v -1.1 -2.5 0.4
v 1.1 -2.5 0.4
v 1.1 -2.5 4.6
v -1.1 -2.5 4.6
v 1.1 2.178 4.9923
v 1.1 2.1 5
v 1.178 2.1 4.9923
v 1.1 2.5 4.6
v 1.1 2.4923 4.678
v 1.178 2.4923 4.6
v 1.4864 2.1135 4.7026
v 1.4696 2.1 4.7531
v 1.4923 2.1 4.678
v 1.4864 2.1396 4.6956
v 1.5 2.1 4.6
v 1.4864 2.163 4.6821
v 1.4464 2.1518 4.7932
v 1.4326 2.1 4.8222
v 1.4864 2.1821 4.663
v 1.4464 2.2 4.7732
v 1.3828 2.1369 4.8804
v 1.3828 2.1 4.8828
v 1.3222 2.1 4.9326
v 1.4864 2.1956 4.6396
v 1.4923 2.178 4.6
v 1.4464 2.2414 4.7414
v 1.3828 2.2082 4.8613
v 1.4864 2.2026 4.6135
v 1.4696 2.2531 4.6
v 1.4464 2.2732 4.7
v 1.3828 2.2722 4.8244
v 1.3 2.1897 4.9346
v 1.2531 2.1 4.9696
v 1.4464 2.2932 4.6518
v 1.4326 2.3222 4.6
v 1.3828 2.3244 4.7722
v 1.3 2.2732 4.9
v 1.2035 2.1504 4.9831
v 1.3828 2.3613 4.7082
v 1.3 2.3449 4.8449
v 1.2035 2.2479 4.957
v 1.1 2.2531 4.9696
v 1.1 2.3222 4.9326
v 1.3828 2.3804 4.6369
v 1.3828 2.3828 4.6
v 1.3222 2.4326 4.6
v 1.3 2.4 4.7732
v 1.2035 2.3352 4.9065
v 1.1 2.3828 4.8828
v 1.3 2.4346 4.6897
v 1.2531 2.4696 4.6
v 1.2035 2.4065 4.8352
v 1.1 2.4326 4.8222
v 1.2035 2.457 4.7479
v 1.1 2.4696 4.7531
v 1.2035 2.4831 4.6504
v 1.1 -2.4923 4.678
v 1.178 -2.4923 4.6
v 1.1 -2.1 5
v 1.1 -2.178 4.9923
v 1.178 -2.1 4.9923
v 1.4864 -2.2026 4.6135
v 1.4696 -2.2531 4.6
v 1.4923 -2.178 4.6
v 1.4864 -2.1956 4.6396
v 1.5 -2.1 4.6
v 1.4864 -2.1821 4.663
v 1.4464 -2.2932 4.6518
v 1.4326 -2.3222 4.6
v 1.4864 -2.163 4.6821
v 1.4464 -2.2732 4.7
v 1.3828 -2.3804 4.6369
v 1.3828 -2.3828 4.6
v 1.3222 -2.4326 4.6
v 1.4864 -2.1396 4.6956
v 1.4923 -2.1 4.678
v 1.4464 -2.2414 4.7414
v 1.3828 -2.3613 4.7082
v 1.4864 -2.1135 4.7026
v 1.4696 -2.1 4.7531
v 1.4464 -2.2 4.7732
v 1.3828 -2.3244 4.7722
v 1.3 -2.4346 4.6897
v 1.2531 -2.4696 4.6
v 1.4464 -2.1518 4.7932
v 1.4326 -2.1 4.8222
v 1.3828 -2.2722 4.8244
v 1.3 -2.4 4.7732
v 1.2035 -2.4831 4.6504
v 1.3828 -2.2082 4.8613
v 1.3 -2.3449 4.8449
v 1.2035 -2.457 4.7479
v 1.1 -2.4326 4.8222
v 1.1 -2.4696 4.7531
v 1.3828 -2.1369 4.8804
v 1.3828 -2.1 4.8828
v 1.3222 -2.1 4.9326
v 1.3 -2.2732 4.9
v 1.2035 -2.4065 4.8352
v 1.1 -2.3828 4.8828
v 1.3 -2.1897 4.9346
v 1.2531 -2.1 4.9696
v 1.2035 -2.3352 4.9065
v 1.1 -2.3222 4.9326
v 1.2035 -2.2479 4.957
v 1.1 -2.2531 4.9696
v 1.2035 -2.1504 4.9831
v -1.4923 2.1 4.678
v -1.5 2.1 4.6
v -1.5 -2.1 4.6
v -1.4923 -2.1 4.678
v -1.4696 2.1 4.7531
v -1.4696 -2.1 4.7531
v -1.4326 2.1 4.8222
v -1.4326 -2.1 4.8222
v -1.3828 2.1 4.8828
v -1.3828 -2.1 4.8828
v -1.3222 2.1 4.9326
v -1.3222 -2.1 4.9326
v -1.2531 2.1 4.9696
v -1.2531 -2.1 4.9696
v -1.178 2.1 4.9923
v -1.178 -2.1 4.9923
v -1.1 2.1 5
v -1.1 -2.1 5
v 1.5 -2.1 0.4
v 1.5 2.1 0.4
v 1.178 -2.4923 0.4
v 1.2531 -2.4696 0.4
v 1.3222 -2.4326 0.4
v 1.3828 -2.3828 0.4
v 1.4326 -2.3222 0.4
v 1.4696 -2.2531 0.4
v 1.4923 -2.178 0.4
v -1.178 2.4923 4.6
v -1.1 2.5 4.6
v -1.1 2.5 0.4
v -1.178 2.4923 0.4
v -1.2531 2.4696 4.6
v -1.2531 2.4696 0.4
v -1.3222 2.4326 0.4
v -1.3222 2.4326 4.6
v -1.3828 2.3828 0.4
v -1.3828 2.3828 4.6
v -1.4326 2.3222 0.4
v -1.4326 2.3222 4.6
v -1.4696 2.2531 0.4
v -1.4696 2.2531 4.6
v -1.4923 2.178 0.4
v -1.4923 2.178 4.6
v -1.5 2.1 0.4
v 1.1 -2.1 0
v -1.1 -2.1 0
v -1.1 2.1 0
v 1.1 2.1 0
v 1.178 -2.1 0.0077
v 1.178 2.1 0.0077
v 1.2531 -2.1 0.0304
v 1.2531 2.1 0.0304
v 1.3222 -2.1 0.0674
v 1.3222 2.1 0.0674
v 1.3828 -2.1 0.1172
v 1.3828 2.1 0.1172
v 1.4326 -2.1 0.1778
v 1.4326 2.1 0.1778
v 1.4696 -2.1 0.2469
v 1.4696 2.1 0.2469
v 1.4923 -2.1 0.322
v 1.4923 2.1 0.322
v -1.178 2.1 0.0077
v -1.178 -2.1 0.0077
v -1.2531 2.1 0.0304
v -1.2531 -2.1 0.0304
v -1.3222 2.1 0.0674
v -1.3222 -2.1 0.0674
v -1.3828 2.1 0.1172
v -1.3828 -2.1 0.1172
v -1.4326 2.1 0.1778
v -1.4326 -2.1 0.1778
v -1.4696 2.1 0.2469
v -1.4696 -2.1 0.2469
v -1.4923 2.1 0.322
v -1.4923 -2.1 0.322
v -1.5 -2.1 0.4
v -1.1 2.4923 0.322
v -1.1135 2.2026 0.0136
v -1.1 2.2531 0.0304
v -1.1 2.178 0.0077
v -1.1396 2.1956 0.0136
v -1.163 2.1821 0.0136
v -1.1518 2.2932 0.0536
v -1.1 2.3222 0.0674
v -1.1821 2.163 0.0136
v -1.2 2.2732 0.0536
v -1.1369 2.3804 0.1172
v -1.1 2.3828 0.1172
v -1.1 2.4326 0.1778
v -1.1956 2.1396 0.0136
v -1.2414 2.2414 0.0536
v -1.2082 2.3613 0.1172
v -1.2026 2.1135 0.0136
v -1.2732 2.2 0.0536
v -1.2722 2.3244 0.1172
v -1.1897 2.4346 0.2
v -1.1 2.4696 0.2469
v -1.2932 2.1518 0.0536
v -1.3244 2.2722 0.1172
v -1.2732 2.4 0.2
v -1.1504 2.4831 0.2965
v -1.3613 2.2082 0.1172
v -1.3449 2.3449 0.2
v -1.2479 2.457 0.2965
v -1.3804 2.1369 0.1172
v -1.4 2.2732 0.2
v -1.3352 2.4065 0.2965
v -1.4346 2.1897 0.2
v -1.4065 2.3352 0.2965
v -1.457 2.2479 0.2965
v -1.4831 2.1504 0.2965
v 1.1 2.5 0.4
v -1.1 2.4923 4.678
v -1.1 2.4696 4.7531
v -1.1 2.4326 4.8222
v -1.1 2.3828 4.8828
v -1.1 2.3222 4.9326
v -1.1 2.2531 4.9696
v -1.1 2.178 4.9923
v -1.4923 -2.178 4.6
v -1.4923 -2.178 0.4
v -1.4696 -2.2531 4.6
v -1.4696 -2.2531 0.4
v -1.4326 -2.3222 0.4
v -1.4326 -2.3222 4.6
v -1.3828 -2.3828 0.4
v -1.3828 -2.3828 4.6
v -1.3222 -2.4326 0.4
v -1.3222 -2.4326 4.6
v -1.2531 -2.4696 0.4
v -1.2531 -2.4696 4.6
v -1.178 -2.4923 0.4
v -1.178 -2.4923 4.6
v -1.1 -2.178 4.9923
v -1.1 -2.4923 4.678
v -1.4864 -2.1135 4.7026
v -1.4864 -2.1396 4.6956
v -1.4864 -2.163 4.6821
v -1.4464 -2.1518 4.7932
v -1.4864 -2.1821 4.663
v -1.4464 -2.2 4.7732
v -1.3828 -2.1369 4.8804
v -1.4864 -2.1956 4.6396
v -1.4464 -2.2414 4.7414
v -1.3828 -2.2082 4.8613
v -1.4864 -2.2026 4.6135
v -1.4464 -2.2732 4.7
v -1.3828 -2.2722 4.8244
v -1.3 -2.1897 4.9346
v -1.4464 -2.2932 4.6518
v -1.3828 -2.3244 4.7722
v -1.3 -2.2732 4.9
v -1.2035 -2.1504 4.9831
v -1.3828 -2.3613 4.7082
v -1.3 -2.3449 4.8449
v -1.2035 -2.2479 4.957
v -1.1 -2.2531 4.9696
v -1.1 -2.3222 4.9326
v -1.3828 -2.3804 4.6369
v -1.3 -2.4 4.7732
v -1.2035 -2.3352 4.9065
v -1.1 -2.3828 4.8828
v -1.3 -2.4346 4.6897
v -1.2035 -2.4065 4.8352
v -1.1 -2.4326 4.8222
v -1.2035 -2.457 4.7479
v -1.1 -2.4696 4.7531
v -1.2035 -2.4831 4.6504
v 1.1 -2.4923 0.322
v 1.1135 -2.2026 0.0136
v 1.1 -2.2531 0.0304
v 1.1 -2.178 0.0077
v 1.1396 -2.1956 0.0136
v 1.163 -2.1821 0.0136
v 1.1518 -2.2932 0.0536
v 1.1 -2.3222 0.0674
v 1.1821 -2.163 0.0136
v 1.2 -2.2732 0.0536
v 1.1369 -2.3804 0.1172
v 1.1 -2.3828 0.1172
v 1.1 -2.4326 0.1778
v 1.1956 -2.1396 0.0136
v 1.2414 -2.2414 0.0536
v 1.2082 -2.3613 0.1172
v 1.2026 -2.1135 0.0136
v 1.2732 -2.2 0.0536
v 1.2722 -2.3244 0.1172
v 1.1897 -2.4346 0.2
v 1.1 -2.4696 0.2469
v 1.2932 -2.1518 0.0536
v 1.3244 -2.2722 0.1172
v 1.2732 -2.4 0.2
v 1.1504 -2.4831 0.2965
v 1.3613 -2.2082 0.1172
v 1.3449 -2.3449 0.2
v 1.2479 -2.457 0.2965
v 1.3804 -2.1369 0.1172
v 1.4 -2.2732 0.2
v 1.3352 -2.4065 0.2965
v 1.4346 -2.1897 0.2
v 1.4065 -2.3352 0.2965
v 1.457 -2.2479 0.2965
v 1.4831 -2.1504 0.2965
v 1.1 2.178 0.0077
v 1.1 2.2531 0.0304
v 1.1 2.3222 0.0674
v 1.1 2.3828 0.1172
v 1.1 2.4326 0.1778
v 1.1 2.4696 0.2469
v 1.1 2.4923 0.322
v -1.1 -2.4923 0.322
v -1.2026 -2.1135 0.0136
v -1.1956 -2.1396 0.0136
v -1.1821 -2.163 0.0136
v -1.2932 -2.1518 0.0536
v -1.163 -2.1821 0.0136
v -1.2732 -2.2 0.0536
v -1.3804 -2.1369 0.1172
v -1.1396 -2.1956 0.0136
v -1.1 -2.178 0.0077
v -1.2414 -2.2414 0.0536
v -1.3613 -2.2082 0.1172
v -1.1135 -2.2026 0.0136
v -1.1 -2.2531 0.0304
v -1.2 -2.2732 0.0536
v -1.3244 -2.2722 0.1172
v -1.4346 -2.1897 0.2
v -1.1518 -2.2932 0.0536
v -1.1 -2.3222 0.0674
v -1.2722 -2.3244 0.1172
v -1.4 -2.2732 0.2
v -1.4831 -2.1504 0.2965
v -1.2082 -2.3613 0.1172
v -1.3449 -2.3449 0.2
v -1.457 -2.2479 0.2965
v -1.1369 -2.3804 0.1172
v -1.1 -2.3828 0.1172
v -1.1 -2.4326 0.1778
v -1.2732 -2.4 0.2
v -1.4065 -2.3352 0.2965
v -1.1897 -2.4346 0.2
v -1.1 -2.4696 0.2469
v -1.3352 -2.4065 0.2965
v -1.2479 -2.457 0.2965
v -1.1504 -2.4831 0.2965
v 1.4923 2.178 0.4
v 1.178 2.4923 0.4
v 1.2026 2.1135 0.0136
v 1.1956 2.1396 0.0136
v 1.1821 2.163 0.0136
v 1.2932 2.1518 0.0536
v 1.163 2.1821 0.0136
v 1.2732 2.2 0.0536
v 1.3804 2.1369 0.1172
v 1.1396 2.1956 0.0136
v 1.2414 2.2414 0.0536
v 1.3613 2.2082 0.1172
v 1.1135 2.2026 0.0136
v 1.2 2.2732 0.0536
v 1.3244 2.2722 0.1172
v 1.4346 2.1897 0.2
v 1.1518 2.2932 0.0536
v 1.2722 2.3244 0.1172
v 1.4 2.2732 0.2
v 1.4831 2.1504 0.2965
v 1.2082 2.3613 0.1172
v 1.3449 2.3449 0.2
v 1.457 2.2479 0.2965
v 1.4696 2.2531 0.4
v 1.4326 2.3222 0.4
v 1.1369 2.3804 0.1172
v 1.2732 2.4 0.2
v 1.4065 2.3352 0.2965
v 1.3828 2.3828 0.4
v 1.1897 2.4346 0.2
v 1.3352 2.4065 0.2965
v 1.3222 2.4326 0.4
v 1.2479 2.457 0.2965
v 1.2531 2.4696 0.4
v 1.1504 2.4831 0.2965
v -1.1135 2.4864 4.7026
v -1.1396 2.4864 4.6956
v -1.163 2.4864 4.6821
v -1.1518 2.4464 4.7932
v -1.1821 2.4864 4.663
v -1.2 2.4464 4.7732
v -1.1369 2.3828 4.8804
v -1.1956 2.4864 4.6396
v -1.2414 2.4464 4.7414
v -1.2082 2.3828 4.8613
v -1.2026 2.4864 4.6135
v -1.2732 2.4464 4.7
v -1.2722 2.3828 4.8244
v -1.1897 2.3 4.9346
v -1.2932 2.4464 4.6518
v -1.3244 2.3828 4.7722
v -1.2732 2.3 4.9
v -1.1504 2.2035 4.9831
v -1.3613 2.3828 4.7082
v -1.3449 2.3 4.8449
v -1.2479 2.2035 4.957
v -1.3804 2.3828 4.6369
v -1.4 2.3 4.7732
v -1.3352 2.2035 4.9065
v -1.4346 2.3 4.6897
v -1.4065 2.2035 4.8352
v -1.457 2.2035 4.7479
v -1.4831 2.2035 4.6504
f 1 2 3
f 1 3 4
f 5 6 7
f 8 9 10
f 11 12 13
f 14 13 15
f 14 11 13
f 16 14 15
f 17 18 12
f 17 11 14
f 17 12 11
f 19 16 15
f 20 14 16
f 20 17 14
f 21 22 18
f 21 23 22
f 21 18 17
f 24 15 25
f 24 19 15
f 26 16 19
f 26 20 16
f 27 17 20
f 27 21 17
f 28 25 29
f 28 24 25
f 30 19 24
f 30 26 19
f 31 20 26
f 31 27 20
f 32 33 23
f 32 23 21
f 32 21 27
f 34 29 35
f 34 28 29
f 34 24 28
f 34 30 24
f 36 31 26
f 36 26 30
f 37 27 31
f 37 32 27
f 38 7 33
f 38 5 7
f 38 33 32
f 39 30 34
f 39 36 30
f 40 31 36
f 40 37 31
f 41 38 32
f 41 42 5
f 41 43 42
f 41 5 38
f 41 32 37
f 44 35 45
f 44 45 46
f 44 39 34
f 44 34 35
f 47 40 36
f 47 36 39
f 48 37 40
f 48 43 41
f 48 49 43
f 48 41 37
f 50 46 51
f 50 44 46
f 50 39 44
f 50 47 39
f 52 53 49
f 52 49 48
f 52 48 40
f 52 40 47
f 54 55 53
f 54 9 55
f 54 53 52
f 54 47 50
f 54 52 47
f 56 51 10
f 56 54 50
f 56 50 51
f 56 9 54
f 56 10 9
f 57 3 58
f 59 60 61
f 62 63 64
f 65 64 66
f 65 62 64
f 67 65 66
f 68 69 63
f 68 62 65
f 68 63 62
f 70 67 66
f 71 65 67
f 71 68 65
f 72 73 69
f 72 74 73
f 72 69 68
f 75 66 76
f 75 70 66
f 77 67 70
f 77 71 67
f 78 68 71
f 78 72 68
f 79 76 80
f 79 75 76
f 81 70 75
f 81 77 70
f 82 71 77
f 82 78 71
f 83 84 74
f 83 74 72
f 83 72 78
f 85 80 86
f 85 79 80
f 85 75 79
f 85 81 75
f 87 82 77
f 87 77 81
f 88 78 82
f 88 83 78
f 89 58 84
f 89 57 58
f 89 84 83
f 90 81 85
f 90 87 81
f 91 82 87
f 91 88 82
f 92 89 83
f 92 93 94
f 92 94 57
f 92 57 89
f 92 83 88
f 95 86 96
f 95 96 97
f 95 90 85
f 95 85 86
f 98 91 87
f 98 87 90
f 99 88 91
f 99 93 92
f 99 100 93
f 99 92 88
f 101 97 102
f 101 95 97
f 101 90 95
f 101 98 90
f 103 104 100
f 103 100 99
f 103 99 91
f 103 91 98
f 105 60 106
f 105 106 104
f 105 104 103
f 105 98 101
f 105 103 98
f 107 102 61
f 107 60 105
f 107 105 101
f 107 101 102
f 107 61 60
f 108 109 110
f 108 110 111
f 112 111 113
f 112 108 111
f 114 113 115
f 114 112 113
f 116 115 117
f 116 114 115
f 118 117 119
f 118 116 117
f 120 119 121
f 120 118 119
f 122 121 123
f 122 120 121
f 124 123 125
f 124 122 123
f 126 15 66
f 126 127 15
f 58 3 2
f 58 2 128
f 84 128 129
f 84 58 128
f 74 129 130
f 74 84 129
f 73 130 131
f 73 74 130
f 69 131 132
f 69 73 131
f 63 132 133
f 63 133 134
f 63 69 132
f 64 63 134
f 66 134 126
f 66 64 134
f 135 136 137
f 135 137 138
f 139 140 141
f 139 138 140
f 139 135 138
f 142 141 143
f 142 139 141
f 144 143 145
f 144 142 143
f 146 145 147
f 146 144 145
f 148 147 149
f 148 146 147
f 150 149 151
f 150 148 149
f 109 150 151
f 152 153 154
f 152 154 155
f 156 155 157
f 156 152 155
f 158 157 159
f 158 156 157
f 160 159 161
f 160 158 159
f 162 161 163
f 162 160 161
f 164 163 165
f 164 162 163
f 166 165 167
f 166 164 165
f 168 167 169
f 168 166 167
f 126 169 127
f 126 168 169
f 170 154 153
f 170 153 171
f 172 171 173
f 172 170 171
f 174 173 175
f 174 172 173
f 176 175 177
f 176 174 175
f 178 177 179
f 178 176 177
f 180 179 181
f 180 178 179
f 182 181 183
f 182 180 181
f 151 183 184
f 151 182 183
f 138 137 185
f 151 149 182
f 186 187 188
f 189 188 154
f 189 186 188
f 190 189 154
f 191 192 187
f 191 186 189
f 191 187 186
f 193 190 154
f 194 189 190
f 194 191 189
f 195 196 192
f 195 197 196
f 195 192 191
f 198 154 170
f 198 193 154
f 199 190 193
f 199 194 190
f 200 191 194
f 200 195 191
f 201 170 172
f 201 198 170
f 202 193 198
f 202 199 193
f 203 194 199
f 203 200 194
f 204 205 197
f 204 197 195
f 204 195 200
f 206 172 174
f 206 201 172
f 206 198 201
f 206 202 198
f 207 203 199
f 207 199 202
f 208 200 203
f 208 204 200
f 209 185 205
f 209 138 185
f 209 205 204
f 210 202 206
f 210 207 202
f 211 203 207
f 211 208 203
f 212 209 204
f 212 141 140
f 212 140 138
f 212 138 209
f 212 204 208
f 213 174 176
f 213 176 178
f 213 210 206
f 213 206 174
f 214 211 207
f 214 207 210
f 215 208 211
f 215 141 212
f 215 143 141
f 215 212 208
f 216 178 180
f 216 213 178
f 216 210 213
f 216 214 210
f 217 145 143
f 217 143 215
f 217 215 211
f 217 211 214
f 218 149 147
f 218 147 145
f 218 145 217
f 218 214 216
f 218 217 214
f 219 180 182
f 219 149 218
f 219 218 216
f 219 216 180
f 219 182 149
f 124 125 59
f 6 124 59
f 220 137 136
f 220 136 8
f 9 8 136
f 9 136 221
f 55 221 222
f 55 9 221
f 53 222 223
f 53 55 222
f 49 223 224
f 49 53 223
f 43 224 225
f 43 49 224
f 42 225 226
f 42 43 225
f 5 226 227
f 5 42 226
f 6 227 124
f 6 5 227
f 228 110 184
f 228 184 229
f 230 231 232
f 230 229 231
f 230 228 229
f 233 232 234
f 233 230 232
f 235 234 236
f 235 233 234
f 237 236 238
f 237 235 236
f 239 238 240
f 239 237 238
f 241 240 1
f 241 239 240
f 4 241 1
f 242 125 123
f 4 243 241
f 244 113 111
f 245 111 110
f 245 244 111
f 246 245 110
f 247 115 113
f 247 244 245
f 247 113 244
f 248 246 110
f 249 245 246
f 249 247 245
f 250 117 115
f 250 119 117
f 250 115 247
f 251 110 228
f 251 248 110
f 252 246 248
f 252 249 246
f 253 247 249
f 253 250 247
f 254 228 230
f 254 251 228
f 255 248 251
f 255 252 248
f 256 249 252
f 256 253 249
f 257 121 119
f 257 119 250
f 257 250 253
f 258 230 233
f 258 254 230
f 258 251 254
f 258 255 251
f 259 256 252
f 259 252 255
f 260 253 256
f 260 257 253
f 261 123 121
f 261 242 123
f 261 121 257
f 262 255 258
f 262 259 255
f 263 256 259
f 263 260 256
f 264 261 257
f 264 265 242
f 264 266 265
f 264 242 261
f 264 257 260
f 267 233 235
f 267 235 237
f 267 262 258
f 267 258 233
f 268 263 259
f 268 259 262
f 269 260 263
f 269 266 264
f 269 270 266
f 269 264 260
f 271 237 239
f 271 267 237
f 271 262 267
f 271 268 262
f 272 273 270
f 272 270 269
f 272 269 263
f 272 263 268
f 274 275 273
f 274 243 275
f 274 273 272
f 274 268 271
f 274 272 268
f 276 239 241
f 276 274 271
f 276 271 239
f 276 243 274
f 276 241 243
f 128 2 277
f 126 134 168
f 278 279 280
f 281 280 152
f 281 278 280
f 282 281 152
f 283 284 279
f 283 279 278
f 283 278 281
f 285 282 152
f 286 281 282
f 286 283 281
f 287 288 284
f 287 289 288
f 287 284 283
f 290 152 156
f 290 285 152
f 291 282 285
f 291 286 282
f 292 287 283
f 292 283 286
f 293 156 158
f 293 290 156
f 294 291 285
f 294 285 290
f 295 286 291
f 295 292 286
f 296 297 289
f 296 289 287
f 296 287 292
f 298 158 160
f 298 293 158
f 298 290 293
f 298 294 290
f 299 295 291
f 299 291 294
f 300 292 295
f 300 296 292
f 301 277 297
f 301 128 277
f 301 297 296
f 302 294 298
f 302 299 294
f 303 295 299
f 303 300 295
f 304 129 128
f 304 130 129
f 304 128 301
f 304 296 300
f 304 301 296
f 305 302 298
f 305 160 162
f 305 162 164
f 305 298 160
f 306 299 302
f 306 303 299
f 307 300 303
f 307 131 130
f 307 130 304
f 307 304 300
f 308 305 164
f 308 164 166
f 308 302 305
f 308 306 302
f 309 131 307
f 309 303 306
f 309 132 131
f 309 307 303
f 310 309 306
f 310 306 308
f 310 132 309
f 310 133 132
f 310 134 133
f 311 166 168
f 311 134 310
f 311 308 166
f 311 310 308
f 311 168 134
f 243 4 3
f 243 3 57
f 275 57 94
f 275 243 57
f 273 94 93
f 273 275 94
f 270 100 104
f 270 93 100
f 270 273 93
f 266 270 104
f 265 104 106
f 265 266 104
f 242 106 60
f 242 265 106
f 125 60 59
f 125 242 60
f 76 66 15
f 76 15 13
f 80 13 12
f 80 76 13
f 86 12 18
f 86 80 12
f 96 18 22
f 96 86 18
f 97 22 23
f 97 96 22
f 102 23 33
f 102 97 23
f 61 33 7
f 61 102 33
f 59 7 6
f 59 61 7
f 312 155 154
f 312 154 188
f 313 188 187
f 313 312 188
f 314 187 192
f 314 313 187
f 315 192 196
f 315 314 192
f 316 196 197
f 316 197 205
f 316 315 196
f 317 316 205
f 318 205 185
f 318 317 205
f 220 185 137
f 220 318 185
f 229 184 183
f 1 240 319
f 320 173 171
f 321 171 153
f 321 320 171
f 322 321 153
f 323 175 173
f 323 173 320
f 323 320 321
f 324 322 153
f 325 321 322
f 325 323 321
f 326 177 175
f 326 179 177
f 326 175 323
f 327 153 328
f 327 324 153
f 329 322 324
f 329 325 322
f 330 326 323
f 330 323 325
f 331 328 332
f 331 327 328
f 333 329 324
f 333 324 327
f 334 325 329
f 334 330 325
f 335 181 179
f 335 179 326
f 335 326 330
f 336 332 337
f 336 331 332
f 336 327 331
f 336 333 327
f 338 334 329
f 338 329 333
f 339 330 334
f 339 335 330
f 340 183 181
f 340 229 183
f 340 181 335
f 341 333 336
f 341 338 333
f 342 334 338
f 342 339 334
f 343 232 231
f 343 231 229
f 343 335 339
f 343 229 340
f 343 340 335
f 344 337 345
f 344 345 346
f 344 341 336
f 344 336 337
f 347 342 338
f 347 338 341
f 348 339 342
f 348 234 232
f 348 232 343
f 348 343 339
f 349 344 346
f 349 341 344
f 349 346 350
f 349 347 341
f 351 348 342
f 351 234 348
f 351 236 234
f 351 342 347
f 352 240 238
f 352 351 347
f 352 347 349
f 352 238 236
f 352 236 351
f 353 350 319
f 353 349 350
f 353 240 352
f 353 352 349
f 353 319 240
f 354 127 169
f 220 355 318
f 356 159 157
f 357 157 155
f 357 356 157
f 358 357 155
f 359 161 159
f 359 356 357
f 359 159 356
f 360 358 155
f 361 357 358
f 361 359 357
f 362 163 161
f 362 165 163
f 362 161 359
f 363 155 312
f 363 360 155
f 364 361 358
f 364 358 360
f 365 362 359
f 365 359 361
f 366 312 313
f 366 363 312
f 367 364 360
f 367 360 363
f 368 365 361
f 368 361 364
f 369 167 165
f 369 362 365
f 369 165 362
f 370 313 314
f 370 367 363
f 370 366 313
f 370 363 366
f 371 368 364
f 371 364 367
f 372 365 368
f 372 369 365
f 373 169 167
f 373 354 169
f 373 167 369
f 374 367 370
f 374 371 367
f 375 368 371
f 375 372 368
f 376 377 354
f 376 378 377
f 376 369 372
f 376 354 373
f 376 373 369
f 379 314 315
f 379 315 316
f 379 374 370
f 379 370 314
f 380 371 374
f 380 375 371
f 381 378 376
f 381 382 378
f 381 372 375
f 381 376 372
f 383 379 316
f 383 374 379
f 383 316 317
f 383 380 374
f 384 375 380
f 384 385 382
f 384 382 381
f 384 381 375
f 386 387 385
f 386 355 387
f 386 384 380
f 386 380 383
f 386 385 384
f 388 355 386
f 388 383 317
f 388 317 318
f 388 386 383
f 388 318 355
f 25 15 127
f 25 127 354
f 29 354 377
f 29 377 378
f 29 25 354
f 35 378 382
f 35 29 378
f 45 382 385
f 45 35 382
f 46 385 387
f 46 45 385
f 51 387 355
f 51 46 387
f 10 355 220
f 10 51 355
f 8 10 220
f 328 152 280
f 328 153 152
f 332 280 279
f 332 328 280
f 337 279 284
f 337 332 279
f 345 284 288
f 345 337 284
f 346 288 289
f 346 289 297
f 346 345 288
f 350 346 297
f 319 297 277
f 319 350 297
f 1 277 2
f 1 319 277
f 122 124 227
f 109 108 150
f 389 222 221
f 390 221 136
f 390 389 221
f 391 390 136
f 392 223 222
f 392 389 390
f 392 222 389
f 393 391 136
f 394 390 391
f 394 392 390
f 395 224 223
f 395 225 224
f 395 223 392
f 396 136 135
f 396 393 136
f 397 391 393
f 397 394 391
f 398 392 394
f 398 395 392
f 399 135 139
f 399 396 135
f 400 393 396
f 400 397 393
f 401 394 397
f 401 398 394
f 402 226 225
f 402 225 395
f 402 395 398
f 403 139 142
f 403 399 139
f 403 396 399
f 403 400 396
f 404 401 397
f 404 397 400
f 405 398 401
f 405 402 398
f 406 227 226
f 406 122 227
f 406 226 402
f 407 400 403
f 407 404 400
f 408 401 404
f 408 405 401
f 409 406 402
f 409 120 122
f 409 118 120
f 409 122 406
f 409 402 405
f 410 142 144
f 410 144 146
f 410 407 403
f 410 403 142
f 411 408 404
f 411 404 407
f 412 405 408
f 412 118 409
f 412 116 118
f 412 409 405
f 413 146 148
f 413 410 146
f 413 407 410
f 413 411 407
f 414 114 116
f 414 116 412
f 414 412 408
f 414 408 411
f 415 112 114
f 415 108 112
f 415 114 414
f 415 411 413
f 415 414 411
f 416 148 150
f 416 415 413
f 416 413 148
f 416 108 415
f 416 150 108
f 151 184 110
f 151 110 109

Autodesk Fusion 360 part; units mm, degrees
sketch "Sketch1" plane through (0, 0, 0) normal (0, 0, 1) x (1, 0, 0)
  line L0 (1.5, -2.5) -> (-1.5, -2.5)
  line L1 (-1.5, -2.5) -> (-1.5, 2.5)
  line L2 (-1.5, 2.5) -> (1.5, 2.5)
  line L3 (1.5, 2.5) -> (1.5, -2.5)
  line L4 (1.5, -2.5) -> (-1.5, 2.5) construction
  line L5 (-1.5, -2.5) -> (1.5, 2.5) construction
  dimension "d1" = 3
  dimension "d2" = 5
extrude "Extrude1" add sketch "Sketch1" along normal blind 5
fillet "Fillet1" radius 0.4 6 faces at (0.5, -0.8333, 5) (0.5, -2.5, 1.6667) (1.5, 0.8333, 1.6667) (-1.5, -0.8333, 1.6667) (-0.5, 2.5, 1.6667) (0.5, -0.8333, 0)
